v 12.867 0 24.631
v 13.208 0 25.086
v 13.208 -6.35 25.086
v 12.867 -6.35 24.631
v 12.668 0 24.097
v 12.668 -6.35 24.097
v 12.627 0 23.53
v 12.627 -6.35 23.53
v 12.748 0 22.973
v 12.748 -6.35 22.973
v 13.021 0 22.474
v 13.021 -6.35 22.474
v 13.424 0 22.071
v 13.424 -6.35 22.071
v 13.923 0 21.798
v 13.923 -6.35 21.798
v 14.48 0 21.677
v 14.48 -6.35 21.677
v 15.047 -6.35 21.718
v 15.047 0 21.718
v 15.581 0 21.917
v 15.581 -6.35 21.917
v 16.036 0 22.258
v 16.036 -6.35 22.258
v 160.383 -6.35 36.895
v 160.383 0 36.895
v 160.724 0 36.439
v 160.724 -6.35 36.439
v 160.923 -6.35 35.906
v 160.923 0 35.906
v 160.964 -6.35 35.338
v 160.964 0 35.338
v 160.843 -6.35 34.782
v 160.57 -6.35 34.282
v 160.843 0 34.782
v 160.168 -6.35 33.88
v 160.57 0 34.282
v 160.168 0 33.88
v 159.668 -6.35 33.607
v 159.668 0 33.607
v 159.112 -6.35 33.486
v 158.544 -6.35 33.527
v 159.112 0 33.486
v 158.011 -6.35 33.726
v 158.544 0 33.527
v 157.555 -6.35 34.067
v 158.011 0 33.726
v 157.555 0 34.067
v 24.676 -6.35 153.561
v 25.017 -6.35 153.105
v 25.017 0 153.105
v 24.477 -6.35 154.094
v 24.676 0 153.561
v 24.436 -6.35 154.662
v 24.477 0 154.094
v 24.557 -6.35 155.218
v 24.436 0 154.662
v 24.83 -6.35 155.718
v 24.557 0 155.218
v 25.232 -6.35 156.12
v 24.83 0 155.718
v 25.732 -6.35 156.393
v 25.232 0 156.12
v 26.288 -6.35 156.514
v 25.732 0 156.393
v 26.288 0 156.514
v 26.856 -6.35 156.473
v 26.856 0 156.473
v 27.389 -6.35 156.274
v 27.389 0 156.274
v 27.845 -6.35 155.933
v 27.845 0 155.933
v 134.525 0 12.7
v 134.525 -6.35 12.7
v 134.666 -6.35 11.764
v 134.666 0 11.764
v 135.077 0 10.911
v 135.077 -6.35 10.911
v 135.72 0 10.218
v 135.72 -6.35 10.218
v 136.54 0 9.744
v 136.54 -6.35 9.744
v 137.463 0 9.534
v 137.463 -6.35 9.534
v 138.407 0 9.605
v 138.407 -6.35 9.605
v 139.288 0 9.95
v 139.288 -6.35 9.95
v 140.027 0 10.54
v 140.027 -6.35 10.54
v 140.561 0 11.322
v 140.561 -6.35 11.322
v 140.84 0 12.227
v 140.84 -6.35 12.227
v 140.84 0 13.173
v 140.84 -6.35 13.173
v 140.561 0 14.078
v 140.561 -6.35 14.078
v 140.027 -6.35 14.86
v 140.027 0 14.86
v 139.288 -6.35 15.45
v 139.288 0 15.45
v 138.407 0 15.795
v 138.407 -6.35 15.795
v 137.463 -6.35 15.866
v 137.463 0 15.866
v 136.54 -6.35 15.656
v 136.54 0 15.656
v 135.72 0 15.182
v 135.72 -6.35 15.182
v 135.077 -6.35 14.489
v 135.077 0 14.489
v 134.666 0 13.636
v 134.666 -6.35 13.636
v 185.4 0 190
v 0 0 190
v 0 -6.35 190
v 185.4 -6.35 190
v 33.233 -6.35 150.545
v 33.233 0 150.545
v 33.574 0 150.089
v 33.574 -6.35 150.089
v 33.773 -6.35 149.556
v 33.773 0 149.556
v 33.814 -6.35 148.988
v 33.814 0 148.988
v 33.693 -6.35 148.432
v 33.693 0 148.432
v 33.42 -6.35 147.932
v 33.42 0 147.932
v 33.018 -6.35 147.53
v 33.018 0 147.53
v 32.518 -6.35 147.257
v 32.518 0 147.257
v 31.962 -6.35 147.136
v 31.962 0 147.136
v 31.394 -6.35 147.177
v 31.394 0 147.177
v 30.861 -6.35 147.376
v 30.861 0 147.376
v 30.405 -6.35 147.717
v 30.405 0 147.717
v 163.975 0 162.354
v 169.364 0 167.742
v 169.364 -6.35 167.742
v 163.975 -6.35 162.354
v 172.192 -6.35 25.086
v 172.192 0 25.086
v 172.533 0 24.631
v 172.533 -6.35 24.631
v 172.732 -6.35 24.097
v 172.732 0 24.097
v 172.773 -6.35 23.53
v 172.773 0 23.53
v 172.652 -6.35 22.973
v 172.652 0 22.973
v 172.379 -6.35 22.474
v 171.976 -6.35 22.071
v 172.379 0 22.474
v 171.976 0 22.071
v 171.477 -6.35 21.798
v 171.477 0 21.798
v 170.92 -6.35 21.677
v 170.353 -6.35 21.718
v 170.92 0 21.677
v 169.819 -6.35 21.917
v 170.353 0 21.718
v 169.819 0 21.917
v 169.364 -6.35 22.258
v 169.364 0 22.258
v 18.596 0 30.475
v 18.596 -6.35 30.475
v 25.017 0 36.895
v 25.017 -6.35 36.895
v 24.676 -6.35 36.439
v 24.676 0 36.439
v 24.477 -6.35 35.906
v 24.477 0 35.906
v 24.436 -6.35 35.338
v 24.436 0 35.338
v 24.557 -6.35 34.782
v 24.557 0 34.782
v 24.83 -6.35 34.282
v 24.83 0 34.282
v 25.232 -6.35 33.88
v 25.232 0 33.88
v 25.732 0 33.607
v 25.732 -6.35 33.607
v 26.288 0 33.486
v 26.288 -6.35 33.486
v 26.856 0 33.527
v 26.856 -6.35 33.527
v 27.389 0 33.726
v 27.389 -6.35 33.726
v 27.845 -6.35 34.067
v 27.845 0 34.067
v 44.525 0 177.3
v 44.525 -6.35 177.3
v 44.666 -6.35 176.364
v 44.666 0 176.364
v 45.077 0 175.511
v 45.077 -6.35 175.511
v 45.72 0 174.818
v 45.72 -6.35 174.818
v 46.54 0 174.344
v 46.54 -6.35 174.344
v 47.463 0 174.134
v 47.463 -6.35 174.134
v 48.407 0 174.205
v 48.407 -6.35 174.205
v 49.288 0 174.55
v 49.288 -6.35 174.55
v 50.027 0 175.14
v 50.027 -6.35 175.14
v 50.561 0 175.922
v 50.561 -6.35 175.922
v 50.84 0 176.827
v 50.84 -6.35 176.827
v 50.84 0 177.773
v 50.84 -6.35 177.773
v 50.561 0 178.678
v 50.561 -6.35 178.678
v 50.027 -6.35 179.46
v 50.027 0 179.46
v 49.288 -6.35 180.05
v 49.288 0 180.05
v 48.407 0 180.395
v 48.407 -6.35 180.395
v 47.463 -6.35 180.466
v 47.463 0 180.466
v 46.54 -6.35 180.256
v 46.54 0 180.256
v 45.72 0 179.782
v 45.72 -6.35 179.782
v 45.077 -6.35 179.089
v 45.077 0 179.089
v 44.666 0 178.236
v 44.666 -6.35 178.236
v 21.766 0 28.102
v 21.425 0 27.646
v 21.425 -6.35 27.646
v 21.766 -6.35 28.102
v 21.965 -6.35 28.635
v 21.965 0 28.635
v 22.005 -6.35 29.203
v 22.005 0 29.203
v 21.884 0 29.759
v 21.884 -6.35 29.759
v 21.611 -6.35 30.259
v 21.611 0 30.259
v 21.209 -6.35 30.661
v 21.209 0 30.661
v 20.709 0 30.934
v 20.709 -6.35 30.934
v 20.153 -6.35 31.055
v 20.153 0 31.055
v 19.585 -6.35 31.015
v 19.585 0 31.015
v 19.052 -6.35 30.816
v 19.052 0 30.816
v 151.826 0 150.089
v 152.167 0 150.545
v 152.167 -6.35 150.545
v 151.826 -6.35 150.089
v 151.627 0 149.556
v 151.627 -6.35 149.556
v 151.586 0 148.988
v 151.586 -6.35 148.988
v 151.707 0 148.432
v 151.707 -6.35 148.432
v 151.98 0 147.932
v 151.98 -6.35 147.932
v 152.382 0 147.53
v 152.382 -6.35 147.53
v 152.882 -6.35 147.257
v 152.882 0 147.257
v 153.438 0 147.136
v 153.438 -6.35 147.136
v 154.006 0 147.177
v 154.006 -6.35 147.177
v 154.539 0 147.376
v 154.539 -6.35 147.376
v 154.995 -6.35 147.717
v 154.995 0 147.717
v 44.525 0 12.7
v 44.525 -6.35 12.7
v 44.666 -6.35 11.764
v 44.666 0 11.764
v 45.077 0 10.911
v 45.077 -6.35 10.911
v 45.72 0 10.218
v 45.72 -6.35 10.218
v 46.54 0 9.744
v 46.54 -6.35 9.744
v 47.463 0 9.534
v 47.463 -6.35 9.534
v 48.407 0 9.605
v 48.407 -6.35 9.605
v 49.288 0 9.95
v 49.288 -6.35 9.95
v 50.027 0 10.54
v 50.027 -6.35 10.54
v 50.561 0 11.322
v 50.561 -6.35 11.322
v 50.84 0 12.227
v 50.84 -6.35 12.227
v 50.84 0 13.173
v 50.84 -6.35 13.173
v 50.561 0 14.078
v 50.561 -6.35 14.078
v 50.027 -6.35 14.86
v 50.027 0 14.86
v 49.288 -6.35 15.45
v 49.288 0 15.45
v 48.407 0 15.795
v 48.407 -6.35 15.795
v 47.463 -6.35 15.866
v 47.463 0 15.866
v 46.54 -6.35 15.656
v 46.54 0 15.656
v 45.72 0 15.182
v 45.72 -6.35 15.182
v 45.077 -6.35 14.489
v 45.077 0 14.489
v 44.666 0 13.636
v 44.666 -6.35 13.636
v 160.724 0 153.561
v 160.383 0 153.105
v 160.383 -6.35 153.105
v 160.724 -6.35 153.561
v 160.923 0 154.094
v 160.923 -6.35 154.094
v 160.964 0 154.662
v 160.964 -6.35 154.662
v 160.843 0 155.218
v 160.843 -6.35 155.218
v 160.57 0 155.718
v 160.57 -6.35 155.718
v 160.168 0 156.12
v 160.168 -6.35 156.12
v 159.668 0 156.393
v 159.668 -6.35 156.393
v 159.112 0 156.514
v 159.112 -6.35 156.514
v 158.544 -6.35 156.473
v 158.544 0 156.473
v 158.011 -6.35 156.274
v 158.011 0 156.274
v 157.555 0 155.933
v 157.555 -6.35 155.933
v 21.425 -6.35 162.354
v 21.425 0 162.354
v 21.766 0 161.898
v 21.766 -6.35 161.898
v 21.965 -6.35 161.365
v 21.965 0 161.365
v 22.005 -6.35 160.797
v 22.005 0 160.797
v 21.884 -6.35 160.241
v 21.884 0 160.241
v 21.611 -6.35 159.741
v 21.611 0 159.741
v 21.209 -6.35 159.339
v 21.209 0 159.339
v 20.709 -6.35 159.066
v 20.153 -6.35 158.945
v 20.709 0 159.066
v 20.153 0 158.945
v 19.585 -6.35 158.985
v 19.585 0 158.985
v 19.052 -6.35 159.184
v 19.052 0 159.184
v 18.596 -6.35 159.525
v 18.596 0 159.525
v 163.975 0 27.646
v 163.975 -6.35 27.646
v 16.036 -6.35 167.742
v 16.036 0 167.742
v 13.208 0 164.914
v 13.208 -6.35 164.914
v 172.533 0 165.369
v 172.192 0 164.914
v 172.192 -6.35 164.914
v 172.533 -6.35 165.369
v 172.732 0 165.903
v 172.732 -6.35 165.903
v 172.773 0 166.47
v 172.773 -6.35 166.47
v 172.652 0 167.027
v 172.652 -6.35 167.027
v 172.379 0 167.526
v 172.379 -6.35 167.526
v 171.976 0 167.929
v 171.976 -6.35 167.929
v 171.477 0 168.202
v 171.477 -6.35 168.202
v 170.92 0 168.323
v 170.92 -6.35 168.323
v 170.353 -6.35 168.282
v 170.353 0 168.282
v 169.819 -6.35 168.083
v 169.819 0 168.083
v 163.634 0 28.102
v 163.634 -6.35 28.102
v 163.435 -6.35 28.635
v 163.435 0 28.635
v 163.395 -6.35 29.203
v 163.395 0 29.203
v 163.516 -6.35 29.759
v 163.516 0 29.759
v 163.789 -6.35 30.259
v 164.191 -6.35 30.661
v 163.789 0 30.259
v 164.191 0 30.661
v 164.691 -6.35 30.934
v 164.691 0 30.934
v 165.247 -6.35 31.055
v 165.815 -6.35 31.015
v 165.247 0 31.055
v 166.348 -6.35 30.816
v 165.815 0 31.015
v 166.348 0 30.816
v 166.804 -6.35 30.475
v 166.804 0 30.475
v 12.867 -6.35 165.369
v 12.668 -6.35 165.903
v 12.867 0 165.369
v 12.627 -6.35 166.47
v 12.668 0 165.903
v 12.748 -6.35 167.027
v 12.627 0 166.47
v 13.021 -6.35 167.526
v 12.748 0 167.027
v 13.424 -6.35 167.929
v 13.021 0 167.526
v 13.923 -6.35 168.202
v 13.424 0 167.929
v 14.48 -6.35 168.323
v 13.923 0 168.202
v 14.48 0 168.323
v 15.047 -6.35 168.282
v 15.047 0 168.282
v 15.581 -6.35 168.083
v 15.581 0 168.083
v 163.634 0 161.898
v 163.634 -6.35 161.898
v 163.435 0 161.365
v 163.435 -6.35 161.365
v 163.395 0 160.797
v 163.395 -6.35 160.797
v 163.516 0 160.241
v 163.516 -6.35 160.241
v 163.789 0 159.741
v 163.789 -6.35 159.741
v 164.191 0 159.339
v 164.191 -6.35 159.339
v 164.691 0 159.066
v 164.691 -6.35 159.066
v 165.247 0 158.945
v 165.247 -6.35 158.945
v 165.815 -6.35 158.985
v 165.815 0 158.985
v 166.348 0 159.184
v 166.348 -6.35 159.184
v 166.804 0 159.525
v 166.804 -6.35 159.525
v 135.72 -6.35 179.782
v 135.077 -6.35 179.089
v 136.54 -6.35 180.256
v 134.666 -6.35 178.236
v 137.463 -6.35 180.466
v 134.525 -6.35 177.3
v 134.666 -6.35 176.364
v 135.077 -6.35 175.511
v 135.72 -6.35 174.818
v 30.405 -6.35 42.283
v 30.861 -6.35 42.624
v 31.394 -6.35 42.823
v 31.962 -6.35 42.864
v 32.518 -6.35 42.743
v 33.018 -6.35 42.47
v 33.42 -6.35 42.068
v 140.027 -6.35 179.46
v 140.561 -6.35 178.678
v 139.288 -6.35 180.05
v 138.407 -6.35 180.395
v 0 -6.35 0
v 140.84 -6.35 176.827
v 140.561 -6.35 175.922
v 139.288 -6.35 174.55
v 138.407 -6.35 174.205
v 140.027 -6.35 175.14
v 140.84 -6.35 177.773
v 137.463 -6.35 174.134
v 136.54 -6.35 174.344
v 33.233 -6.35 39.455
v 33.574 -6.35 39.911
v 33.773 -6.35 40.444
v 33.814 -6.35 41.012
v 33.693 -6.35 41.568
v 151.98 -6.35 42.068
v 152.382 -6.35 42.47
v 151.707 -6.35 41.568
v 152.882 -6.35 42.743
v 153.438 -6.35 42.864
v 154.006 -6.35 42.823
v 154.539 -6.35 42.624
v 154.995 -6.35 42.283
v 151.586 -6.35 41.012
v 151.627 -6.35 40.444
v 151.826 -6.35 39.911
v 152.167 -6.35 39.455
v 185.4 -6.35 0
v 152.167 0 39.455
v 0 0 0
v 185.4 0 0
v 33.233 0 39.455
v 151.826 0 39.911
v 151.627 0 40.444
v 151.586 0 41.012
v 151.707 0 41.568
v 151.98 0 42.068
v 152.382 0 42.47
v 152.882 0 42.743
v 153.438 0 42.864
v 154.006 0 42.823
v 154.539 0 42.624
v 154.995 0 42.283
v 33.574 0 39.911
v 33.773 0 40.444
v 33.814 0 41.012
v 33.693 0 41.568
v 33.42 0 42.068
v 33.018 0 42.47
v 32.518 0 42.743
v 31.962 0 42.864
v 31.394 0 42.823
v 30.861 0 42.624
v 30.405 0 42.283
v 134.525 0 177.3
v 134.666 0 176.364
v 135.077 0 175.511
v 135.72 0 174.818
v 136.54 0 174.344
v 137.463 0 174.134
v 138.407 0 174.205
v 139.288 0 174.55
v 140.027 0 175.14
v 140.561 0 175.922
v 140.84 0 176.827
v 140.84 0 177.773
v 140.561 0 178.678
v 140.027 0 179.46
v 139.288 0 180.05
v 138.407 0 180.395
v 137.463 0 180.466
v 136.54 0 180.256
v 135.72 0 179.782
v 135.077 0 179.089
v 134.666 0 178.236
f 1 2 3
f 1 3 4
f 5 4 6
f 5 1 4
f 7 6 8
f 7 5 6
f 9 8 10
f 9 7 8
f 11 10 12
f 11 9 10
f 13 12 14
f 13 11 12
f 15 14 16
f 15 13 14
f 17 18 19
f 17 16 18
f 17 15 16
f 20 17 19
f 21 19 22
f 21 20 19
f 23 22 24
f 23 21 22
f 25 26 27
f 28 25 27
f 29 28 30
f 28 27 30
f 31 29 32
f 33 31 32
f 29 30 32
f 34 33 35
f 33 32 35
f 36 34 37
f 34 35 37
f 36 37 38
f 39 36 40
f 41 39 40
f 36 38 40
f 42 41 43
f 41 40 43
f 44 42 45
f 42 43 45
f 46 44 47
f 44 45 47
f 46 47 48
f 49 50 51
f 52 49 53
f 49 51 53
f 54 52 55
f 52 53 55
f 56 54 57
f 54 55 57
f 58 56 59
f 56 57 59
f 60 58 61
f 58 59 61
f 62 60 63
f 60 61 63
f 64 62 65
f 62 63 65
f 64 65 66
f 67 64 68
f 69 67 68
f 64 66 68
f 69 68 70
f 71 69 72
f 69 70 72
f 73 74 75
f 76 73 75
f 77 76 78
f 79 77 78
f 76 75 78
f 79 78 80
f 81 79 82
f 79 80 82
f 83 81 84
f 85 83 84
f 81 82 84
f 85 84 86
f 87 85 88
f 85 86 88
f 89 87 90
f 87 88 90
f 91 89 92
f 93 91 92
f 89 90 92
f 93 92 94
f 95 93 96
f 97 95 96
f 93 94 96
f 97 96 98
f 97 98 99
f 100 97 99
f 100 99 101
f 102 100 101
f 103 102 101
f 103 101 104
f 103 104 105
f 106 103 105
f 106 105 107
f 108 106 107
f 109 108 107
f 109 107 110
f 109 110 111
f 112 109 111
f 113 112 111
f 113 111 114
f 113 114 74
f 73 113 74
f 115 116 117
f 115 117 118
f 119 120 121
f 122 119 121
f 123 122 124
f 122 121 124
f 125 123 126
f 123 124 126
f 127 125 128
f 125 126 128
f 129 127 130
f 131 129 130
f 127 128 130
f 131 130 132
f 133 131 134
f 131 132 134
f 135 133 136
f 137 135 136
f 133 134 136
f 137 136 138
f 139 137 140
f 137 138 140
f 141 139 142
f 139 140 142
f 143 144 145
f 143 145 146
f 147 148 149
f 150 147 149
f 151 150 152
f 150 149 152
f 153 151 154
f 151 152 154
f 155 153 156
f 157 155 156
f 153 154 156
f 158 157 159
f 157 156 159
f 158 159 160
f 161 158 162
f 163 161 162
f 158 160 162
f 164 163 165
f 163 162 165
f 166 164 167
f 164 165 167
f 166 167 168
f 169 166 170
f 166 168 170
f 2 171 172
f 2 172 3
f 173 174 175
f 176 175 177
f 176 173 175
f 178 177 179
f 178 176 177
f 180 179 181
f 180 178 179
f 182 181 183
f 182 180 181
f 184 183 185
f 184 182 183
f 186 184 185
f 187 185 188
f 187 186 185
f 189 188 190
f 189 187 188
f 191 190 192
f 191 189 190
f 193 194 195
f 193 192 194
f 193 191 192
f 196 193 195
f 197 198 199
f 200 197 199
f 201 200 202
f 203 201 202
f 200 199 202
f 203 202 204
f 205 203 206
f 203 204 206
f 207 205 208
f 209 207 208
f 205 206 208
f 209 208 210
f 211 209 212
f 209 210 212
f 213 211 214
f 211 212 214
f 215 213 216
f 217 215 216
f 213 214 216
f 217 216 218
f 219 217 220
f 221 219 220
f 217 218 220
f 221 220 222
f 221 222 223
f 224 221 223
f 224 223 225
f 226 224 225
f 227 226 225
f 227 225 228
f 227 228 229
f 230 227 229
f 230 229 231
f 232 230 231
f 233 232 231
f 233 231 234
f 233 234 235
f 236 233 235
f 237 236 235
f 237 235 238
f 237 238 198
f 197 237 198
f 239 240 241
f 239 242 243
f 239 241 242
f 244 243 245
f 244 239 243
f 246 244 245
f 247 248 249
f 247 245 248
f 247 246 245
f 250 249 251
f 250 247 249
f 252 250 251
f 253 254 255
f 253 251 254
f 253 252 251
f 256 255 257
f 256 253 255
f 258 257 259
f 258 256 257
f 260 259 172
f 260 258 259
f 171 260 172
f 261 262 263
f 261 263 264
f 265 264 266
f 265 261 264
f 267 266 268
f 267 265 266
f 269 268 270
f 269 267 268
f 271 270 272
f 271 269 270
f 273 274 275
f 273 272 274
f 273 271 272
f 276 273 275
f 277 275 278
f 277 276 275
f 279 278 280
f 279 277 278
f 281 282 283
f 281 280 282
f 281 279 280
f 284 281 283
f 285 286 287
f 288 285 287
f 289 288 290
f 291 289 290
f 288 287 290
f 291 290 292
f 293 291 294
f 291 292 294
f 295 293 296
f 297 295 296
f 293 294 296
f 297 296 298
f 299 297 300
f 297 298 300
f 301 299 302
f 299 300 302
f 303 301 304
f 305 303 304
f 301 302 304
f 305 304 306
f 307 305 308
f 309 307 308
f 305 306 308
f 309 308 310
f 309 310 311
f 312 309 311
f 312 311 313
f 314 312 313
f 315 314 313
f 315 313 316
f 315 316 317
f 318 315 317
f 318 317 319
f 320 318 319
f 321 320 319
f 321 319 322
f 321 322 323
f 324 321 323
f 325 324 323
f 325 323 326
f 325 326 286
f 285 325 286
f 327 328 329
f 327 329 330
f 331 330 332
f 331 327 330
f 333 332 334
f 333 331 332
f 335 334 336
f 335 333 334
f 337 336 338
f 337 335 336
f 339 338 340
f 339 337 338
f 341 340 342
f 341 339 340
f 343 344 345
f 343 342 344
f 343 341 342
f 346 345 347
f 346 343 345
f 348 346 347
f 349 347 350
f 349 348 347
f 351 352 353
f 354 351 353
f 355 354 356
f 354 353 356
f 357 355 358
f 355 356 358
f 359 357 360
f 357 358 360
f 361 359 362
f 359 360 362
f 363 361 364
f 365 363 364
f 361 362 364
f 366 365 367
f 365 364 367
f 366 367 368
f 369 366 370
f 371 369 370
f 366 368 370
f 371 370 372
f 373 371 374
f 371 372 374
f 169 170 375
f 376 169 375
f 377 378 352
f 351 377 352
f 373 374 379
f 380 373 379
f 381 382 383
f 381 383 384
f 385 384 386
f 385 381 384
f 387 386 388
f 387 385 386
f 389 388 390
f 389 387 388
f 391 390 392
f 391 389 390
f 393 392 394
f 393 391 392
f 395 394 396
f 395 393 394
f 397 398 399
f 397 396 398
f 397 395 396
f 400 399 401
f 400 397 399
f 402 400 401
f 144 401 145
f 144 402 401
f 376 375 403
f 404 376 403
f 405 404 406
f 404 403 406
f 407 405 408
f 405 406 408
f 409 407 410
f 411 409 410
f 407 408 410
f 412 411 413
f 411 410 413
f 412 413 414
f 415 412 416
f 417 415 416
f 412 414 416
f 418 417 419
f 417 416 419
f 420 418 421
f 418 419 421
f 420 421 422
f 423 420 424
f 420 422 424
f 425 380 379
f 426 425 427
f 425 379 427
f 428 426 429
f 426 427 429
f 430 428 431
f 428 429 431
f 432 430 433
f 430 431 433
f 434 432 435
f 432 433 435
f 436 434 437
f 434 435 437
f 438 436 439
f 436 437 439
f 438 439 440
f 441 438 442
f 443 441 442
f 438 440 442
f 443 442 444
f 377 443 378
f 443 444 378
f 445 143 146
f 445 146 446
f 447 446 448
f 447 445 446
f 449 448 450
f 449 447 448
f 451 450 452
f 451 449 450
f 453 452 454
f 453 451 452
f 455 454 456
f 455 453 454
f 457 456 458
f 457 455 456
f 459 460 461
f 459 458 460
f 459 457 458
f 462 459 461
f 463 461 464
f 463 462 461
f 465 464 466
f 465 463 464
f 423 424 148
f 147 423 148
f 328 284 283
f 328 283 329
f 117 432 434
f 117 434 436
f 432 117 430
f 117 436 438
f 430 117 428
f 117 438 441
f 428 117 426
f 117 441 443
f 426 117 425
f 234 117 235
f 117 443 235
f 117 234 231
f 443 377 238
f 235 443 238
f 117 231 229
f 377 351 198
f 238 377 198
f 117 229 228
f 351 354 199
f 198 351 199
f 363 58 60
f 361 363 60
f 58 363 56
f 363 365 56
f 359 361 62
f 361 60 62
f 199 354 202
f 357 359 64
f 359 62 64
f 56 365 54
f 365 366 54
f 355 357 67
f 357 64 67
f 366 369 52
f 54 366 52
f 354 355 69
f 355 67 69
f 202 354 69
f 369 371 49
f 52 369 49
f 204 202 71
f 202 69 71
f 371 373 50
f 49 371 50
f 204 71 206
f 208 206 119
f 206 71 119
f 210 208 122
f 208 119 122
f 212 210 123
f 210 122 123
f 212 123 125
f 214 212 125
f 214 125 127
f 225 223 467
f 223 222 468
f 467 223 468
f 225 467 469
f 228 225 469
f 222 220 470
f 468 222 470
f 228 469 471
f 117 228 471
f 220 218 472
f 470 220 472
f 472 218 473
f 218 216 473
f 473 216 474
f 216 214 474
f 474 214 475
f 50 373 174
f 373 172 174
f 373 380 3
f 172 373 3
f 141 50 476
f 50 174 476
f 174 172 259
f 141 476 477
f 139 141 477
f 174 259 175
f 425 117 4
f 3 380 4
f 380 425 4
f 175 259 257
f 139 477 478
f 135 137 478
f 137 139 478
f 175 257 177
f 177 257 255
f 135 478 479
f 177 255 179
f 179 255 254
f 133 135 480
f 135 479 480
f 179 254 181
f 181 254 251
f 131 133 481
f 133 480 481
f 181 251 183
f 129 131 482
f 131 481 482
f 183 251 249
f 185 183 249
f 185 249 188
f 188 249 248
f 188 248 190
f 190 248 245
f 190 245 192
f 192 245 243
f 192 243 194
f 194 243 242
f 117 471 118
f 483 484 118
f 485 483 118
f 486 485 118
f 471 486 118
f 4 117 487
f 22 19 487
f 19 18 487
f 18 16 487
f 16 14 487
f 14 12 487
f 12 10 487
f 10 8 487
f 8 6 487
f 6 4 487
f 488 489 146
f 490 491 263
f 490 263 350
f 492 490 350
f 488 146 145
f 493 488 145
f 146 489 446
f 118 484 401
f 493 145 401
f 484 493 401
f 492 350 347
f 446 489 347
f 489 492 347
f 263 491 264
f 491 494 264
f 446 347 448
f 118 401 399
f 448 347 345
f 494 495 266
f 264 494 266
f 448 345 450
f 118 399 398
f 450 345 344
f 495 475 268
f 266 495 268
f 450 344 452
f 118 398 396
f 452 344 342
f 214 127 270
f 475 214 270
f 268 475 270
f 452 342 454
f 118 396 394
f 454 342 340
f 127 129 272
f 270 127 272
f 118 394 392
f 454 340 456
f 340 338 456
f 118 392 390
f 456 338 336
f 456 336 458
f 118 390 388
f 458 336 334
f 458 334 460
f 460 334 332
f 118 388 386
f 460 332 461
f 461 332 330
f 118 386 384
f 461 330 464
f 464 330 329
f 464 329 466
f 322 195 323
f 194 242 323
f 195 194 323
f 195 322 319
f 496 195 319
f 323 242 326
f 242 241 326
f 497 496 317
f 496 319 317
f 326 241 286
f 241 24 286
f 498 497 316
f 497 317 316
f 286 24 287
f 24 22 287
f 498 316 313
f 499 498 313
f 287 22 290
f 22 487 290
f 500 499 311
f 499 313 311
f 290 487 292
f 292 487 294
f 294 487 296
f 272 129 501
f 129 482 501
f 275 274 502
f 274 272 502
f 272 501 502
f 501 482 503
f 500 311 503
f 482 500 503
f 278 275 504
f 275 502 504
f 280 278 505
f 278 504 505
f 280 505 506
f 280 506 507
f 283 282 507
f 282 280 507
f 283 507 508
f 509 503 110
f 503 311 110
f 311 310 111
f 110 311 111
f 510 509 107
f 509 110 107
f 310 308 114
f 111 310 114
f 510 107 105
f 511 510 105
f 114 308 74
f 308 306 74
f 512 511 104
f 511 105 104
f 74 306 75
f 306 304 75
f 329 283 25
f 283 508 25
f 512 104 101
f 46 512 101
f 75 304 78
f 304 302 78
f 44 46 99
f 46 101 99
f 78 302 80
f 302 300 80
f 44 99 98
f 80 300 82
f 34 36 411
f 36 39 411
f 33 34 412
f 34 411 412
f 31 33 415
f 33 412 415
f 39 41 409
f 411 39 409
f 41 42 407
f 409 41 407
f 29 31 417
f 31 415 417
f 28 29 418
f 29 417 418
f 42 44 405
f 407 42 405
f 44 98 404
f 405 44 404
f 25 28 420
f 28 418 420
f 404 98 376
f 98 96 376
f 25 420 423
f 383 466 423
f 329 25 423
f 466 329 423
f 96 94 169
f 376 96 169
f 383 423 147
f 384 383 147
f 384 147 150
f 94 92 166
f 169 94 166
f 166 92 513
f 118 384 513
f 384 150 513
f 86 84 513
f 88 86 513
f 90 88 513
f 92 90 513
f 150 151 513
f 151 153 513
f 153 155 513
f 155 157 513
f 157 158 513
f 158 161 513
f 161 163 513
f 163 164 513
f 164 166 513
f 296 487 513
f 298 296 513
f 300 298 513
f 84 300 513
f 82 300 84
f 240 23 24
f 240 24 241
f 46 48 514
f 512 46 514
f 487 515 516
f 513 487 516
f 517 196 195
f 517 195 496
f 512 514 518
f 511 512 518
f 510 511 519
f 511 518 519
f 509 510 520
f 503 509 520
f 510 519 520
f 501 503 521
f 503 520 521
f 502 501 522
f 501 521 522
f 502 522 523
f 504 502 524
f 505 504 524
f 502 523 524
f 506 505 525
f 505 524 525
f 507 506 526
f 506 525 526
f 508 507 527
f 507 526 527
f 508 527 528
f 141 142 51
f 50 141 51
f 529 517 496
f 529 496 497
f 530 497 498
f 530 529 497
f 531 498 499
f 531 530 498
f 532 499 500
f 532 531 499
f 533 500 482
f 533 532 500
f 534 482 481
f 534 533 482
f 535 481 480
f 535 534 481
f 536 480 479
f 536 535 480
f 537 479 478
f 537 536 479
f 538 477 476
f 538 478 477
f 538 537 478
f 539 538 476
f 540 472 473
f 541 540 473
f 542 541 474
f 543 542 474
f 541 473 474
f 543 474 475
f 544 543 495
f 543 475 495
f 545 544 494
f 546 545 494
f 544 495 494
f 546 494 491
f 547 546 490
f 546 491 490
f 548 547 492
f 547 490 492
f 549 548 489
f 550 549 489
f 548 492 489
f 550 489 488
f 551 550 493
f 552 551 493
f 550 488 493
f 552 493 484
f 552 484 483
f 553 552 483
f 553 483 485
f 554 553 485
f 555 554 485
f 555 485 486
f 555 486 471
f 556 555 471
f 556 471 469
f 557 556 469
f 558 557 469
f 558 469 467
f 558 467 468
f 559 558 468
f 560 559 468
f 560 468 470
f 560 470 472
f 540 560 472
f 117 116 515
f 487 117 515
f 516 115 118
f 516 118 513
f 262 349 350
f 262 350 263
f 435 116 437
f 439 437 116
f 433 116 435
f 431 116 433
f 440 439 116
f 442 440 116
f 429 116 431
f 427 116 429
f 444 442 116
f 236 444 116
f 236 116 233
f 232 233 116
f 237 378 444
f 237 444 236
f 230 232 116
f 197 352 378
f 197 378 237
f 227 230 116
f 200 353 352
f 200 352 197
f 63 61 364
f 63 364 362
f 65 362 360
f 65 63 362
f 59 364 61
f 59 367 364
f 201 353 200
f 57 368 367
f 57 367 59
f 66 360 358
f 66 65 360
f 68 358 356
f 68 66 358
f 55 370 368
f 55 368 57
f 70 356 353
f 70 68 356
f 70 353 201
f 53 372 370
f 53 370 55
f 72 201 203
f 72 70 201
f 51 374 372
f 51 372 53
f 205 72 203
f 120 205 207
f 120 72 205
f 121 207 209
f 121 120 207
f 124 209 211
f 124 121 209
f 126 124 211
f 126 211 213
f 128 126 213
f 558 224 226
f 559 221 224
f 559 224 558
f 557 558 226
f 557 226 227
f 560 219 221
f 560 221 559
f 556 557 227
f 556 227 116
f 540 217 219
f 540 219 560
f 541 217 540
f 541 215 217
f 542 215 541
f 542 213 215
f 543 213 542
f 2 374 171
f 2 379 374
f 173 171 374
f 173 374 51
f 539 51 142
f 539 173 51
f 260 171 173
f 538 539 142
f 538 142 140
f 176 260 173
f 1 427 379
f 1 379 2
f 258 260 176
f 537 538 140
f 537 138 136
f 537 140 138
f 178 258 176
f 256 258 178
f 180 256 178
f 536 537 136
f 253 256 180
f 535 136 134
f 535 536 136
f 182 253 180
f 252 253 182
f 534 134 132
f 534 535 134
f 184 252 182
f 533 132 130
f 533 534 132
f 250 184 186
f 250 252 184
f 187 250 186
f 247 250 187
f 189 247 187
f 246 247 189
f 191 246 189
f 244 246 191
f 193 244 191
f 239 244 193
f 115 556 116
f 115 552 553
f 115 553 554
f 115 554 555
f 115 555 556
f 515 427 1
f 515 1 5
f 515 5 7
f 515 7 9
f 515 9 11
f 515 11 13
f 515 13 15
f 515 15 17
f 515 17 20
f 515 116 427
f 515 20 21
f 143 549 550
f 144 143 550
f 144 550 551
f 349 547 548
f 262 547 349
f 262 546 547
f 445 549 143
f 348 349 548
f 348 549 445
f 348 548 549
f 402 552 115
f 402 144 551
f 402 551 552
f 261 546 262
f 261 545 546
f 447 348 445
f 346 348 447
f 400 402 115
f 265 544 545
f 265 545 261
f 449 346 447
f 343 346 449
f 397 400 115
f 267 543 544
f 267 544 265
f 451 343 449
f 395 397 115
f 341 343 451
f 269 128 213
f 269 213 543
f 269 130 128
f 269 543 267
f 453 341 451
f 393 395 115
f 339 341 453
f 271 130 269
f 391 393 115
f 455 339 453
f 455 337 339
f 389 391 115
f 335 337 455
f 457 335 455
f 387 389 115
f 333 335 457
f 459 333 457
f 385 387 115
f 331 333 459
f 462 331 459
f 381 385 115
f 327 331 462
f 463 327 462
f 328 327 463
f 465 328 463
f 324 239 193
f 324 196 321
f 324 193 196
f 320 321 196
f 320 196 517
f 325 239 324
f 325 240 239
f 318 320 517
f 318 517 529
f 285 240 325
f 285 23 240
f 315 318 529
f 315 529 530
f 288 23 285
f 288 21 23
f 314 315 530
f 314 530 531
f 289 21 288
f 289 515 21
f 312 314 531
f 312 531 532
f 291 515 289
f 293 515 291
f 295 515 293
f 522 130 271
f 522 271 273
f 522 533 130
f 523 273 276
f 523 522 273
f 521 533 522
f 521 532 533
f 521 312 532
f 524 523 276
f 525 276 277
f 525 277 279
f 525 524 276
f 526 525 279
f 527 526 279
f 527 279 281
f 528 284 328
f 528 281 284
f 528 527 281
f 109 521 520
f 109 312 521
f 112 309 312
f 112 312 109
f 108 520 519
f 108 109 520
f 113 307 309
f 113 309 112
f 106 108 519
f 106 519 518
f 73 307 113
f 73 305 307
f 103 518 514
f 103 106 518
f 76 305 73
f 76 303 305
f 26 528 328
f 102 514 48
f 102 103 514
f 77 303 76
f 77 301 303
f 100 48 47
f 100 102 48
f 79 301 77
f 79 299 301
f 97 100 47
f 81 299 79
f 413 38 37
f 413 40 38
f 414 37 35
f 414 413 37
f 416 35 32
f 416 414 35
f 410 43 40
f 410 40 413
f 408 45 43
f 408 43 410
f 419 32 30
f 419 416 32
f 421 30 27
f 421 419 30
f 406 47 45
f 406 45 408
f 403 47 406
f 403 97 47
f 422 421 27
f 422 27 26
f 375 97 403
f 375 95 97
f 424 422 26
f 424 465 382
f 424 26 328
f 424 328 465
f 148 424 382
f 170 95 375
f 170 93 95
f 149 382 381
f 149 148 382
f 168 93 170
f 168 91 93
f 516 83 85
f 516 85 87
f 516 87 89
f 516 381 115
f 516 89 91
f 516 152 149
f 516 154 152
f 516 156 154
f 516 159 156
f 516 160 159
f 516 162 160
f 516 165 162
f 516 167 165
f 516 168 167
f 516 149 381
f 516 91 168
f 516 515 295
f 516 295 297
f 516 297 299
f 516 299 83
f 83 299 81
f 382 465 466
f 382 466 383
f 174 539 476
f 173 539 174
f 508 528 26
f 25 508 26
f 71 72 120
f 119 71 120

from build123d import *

# Parameters (mm, degrees)
SKETCH1_W              = 185.4
SKETCH1_H              = 190
BASE_PLATE_DEPTH       = 6.35
SLOTS_DEPTH            = 7.35
FEET_CONNECTION_HOLE_D = 6.35


with BuildPart() as part:
    # Sketch1 → base plate (new body)
    with BuildSketch(Plane(origin=(0, 0, 0), x_dir=(1, 0, 0), z_dir=(0, 1, 0))):
        with Locations((92.7, -95)):
            Rectangle(SKETCH1_W, SKETCH1_H)
    extrude(amount=-BASE_PLATE_DEPTH)

    # Sketch3 → slots (cut, through all)
    with BuildSketch(Plane(origin=(0, 0, 0), x_dir=(1, 0, 0), z_dir=(0, 1, 0))):
        with BuildLine():
            ThreePointArc((21.424612456, -27.64618524), (21.424612456, -30.474612456), (18.59618524, -30.474612456))
            Line((18.59618524, -30.474612456), (13.208031568, -25.086458783))
            ThreePointArc((13.208031568, -25.086458783), (13.208031568, -22.258031568), (16.036458783, -22.258031568))
            Line((16.036458783, -22.258031568), (21.424612456, -27.64618524))
        make_face()
        with BuildLine():
            Line((169.363541217, -22.258031568), (163.975387544, -27.64618524))
            ThreePointArc((163.975387544, -27.64618524), (163.975387544, -30.474612456), (166.80381476, -30.474612456))
            Line((166.80381476, -30.474612456), (172.191968432, -25.086458783))
            ThreePointArc((172.191968432, -25.086458783), (172.191968432, -22.258031568), (169.363541217, -22.258031568))
        make_face()
        with BuildLine():
            Line((154.995131423, -42.283295792), (160.383285096, -36.895142119))
            ThreePointArc((160.383285096, -36.895142119), (160.383285096, -34.066714904), (157.554857881, -34.066714904))
            Line((157.554857881, -34.066714904), (152.166704208, -39.454868577))
            ThreePointArc((152.166704208, -39.454868577), (152.166704208, -42.283295792), (154.995131423, -42.283295792))
        make_face()
        with BuildLine():
            ThreePointArc((160.383285096, -153.104857881), (160.383285096, -155.933285096), (157.554857881, -155.933285096))
            Line((157.554857881, -155.933285096), (152.166704208, -150.545131423))
            ThreePointArc((152.166704208, -150.545131423), (152.166704208, -147.716704208), (154.995131423, -147.716704208))
            Line((154.995131423, -147.716704208), (160.383285096, -153.104857881))
        make_face()
        with BuildLine():
            ThreePointArc((163.975387544, -162.35381476), (163.975387544, -159.525387544), (166.80381476, -159.525387544))
            Line((166.80381476, -159.525387544), (172.191968432, -164.913541217))
            ThreePointArc((172.191968432, -164.913541217), (172.191968432, -167.741968432), (169.363541217, -167.741968432))
            Line((169.363541217, -167.741968432), (163.975387544, -162.35381476))
        make_face()
        with BuildLine():
            Line((16.036458783, -167.741968432), (21.424612456, -162.35381476))
            ThreePointArc((21.424612456, -162.35381476), (21.424612456, -159.525387544), (18.59618524, -159.525387544))
            Line((18.59618524, -159.525387544), (13.208031568, -164.913541217))
            ThreePointArc((13.208031568, -164.913541217), (13.208031568, -167.741968432), (16.036458783, -167.741968432))
        make_face()
        with BuildLine():
            Line((30.404868577, -147.716704208), (25.016714904, -153.104857881))
            ThreePointArc((25.016714904, -153.104857881), (25.016714904, -155.933285096), (27.845142119, -155.933285096))
            Line((27.845142119, -155.933285096), (33.233295792, -150.545131423))
            ThreePointArc((33.233295792, -150.545131423), (33.233295792, -147.716704208), (30.404868577, -147.716704208))
        make_face()
        with BuildLine():
            Line((30.404868577, -42.283295792), (25.016714904, -36.895142119))
            ThreePointArc((25.016714904, -36.895142119), (25.016714904, -34.066714904), (27.845142119, -34.066714904))
            Line((27.845142119, -34.066714904), (33.233295792, -39.454868577))
            ThreePointArc((33.233295792, -39.454868577), (33.233295792, -42.283295792), (30.404868577, -42.283295792))
        make_face()
    extrude(amount=-SLOTS_DEPTH, mode=Mode.SUBTRACT)

    # Feet connection hole (through all)
    with Locations(Plane(origin=(0, 0, 0), x_dir=(1, 0, 0), z_dir=(0, 1, 0))):
        with Locations((47.7, -177.3), (137.7, -12.7), (47.7, -12.7), (137.7, -177.3)):
            Hole(FEET_CONNECTION_HOLE_D / 2)


solid = part.part
